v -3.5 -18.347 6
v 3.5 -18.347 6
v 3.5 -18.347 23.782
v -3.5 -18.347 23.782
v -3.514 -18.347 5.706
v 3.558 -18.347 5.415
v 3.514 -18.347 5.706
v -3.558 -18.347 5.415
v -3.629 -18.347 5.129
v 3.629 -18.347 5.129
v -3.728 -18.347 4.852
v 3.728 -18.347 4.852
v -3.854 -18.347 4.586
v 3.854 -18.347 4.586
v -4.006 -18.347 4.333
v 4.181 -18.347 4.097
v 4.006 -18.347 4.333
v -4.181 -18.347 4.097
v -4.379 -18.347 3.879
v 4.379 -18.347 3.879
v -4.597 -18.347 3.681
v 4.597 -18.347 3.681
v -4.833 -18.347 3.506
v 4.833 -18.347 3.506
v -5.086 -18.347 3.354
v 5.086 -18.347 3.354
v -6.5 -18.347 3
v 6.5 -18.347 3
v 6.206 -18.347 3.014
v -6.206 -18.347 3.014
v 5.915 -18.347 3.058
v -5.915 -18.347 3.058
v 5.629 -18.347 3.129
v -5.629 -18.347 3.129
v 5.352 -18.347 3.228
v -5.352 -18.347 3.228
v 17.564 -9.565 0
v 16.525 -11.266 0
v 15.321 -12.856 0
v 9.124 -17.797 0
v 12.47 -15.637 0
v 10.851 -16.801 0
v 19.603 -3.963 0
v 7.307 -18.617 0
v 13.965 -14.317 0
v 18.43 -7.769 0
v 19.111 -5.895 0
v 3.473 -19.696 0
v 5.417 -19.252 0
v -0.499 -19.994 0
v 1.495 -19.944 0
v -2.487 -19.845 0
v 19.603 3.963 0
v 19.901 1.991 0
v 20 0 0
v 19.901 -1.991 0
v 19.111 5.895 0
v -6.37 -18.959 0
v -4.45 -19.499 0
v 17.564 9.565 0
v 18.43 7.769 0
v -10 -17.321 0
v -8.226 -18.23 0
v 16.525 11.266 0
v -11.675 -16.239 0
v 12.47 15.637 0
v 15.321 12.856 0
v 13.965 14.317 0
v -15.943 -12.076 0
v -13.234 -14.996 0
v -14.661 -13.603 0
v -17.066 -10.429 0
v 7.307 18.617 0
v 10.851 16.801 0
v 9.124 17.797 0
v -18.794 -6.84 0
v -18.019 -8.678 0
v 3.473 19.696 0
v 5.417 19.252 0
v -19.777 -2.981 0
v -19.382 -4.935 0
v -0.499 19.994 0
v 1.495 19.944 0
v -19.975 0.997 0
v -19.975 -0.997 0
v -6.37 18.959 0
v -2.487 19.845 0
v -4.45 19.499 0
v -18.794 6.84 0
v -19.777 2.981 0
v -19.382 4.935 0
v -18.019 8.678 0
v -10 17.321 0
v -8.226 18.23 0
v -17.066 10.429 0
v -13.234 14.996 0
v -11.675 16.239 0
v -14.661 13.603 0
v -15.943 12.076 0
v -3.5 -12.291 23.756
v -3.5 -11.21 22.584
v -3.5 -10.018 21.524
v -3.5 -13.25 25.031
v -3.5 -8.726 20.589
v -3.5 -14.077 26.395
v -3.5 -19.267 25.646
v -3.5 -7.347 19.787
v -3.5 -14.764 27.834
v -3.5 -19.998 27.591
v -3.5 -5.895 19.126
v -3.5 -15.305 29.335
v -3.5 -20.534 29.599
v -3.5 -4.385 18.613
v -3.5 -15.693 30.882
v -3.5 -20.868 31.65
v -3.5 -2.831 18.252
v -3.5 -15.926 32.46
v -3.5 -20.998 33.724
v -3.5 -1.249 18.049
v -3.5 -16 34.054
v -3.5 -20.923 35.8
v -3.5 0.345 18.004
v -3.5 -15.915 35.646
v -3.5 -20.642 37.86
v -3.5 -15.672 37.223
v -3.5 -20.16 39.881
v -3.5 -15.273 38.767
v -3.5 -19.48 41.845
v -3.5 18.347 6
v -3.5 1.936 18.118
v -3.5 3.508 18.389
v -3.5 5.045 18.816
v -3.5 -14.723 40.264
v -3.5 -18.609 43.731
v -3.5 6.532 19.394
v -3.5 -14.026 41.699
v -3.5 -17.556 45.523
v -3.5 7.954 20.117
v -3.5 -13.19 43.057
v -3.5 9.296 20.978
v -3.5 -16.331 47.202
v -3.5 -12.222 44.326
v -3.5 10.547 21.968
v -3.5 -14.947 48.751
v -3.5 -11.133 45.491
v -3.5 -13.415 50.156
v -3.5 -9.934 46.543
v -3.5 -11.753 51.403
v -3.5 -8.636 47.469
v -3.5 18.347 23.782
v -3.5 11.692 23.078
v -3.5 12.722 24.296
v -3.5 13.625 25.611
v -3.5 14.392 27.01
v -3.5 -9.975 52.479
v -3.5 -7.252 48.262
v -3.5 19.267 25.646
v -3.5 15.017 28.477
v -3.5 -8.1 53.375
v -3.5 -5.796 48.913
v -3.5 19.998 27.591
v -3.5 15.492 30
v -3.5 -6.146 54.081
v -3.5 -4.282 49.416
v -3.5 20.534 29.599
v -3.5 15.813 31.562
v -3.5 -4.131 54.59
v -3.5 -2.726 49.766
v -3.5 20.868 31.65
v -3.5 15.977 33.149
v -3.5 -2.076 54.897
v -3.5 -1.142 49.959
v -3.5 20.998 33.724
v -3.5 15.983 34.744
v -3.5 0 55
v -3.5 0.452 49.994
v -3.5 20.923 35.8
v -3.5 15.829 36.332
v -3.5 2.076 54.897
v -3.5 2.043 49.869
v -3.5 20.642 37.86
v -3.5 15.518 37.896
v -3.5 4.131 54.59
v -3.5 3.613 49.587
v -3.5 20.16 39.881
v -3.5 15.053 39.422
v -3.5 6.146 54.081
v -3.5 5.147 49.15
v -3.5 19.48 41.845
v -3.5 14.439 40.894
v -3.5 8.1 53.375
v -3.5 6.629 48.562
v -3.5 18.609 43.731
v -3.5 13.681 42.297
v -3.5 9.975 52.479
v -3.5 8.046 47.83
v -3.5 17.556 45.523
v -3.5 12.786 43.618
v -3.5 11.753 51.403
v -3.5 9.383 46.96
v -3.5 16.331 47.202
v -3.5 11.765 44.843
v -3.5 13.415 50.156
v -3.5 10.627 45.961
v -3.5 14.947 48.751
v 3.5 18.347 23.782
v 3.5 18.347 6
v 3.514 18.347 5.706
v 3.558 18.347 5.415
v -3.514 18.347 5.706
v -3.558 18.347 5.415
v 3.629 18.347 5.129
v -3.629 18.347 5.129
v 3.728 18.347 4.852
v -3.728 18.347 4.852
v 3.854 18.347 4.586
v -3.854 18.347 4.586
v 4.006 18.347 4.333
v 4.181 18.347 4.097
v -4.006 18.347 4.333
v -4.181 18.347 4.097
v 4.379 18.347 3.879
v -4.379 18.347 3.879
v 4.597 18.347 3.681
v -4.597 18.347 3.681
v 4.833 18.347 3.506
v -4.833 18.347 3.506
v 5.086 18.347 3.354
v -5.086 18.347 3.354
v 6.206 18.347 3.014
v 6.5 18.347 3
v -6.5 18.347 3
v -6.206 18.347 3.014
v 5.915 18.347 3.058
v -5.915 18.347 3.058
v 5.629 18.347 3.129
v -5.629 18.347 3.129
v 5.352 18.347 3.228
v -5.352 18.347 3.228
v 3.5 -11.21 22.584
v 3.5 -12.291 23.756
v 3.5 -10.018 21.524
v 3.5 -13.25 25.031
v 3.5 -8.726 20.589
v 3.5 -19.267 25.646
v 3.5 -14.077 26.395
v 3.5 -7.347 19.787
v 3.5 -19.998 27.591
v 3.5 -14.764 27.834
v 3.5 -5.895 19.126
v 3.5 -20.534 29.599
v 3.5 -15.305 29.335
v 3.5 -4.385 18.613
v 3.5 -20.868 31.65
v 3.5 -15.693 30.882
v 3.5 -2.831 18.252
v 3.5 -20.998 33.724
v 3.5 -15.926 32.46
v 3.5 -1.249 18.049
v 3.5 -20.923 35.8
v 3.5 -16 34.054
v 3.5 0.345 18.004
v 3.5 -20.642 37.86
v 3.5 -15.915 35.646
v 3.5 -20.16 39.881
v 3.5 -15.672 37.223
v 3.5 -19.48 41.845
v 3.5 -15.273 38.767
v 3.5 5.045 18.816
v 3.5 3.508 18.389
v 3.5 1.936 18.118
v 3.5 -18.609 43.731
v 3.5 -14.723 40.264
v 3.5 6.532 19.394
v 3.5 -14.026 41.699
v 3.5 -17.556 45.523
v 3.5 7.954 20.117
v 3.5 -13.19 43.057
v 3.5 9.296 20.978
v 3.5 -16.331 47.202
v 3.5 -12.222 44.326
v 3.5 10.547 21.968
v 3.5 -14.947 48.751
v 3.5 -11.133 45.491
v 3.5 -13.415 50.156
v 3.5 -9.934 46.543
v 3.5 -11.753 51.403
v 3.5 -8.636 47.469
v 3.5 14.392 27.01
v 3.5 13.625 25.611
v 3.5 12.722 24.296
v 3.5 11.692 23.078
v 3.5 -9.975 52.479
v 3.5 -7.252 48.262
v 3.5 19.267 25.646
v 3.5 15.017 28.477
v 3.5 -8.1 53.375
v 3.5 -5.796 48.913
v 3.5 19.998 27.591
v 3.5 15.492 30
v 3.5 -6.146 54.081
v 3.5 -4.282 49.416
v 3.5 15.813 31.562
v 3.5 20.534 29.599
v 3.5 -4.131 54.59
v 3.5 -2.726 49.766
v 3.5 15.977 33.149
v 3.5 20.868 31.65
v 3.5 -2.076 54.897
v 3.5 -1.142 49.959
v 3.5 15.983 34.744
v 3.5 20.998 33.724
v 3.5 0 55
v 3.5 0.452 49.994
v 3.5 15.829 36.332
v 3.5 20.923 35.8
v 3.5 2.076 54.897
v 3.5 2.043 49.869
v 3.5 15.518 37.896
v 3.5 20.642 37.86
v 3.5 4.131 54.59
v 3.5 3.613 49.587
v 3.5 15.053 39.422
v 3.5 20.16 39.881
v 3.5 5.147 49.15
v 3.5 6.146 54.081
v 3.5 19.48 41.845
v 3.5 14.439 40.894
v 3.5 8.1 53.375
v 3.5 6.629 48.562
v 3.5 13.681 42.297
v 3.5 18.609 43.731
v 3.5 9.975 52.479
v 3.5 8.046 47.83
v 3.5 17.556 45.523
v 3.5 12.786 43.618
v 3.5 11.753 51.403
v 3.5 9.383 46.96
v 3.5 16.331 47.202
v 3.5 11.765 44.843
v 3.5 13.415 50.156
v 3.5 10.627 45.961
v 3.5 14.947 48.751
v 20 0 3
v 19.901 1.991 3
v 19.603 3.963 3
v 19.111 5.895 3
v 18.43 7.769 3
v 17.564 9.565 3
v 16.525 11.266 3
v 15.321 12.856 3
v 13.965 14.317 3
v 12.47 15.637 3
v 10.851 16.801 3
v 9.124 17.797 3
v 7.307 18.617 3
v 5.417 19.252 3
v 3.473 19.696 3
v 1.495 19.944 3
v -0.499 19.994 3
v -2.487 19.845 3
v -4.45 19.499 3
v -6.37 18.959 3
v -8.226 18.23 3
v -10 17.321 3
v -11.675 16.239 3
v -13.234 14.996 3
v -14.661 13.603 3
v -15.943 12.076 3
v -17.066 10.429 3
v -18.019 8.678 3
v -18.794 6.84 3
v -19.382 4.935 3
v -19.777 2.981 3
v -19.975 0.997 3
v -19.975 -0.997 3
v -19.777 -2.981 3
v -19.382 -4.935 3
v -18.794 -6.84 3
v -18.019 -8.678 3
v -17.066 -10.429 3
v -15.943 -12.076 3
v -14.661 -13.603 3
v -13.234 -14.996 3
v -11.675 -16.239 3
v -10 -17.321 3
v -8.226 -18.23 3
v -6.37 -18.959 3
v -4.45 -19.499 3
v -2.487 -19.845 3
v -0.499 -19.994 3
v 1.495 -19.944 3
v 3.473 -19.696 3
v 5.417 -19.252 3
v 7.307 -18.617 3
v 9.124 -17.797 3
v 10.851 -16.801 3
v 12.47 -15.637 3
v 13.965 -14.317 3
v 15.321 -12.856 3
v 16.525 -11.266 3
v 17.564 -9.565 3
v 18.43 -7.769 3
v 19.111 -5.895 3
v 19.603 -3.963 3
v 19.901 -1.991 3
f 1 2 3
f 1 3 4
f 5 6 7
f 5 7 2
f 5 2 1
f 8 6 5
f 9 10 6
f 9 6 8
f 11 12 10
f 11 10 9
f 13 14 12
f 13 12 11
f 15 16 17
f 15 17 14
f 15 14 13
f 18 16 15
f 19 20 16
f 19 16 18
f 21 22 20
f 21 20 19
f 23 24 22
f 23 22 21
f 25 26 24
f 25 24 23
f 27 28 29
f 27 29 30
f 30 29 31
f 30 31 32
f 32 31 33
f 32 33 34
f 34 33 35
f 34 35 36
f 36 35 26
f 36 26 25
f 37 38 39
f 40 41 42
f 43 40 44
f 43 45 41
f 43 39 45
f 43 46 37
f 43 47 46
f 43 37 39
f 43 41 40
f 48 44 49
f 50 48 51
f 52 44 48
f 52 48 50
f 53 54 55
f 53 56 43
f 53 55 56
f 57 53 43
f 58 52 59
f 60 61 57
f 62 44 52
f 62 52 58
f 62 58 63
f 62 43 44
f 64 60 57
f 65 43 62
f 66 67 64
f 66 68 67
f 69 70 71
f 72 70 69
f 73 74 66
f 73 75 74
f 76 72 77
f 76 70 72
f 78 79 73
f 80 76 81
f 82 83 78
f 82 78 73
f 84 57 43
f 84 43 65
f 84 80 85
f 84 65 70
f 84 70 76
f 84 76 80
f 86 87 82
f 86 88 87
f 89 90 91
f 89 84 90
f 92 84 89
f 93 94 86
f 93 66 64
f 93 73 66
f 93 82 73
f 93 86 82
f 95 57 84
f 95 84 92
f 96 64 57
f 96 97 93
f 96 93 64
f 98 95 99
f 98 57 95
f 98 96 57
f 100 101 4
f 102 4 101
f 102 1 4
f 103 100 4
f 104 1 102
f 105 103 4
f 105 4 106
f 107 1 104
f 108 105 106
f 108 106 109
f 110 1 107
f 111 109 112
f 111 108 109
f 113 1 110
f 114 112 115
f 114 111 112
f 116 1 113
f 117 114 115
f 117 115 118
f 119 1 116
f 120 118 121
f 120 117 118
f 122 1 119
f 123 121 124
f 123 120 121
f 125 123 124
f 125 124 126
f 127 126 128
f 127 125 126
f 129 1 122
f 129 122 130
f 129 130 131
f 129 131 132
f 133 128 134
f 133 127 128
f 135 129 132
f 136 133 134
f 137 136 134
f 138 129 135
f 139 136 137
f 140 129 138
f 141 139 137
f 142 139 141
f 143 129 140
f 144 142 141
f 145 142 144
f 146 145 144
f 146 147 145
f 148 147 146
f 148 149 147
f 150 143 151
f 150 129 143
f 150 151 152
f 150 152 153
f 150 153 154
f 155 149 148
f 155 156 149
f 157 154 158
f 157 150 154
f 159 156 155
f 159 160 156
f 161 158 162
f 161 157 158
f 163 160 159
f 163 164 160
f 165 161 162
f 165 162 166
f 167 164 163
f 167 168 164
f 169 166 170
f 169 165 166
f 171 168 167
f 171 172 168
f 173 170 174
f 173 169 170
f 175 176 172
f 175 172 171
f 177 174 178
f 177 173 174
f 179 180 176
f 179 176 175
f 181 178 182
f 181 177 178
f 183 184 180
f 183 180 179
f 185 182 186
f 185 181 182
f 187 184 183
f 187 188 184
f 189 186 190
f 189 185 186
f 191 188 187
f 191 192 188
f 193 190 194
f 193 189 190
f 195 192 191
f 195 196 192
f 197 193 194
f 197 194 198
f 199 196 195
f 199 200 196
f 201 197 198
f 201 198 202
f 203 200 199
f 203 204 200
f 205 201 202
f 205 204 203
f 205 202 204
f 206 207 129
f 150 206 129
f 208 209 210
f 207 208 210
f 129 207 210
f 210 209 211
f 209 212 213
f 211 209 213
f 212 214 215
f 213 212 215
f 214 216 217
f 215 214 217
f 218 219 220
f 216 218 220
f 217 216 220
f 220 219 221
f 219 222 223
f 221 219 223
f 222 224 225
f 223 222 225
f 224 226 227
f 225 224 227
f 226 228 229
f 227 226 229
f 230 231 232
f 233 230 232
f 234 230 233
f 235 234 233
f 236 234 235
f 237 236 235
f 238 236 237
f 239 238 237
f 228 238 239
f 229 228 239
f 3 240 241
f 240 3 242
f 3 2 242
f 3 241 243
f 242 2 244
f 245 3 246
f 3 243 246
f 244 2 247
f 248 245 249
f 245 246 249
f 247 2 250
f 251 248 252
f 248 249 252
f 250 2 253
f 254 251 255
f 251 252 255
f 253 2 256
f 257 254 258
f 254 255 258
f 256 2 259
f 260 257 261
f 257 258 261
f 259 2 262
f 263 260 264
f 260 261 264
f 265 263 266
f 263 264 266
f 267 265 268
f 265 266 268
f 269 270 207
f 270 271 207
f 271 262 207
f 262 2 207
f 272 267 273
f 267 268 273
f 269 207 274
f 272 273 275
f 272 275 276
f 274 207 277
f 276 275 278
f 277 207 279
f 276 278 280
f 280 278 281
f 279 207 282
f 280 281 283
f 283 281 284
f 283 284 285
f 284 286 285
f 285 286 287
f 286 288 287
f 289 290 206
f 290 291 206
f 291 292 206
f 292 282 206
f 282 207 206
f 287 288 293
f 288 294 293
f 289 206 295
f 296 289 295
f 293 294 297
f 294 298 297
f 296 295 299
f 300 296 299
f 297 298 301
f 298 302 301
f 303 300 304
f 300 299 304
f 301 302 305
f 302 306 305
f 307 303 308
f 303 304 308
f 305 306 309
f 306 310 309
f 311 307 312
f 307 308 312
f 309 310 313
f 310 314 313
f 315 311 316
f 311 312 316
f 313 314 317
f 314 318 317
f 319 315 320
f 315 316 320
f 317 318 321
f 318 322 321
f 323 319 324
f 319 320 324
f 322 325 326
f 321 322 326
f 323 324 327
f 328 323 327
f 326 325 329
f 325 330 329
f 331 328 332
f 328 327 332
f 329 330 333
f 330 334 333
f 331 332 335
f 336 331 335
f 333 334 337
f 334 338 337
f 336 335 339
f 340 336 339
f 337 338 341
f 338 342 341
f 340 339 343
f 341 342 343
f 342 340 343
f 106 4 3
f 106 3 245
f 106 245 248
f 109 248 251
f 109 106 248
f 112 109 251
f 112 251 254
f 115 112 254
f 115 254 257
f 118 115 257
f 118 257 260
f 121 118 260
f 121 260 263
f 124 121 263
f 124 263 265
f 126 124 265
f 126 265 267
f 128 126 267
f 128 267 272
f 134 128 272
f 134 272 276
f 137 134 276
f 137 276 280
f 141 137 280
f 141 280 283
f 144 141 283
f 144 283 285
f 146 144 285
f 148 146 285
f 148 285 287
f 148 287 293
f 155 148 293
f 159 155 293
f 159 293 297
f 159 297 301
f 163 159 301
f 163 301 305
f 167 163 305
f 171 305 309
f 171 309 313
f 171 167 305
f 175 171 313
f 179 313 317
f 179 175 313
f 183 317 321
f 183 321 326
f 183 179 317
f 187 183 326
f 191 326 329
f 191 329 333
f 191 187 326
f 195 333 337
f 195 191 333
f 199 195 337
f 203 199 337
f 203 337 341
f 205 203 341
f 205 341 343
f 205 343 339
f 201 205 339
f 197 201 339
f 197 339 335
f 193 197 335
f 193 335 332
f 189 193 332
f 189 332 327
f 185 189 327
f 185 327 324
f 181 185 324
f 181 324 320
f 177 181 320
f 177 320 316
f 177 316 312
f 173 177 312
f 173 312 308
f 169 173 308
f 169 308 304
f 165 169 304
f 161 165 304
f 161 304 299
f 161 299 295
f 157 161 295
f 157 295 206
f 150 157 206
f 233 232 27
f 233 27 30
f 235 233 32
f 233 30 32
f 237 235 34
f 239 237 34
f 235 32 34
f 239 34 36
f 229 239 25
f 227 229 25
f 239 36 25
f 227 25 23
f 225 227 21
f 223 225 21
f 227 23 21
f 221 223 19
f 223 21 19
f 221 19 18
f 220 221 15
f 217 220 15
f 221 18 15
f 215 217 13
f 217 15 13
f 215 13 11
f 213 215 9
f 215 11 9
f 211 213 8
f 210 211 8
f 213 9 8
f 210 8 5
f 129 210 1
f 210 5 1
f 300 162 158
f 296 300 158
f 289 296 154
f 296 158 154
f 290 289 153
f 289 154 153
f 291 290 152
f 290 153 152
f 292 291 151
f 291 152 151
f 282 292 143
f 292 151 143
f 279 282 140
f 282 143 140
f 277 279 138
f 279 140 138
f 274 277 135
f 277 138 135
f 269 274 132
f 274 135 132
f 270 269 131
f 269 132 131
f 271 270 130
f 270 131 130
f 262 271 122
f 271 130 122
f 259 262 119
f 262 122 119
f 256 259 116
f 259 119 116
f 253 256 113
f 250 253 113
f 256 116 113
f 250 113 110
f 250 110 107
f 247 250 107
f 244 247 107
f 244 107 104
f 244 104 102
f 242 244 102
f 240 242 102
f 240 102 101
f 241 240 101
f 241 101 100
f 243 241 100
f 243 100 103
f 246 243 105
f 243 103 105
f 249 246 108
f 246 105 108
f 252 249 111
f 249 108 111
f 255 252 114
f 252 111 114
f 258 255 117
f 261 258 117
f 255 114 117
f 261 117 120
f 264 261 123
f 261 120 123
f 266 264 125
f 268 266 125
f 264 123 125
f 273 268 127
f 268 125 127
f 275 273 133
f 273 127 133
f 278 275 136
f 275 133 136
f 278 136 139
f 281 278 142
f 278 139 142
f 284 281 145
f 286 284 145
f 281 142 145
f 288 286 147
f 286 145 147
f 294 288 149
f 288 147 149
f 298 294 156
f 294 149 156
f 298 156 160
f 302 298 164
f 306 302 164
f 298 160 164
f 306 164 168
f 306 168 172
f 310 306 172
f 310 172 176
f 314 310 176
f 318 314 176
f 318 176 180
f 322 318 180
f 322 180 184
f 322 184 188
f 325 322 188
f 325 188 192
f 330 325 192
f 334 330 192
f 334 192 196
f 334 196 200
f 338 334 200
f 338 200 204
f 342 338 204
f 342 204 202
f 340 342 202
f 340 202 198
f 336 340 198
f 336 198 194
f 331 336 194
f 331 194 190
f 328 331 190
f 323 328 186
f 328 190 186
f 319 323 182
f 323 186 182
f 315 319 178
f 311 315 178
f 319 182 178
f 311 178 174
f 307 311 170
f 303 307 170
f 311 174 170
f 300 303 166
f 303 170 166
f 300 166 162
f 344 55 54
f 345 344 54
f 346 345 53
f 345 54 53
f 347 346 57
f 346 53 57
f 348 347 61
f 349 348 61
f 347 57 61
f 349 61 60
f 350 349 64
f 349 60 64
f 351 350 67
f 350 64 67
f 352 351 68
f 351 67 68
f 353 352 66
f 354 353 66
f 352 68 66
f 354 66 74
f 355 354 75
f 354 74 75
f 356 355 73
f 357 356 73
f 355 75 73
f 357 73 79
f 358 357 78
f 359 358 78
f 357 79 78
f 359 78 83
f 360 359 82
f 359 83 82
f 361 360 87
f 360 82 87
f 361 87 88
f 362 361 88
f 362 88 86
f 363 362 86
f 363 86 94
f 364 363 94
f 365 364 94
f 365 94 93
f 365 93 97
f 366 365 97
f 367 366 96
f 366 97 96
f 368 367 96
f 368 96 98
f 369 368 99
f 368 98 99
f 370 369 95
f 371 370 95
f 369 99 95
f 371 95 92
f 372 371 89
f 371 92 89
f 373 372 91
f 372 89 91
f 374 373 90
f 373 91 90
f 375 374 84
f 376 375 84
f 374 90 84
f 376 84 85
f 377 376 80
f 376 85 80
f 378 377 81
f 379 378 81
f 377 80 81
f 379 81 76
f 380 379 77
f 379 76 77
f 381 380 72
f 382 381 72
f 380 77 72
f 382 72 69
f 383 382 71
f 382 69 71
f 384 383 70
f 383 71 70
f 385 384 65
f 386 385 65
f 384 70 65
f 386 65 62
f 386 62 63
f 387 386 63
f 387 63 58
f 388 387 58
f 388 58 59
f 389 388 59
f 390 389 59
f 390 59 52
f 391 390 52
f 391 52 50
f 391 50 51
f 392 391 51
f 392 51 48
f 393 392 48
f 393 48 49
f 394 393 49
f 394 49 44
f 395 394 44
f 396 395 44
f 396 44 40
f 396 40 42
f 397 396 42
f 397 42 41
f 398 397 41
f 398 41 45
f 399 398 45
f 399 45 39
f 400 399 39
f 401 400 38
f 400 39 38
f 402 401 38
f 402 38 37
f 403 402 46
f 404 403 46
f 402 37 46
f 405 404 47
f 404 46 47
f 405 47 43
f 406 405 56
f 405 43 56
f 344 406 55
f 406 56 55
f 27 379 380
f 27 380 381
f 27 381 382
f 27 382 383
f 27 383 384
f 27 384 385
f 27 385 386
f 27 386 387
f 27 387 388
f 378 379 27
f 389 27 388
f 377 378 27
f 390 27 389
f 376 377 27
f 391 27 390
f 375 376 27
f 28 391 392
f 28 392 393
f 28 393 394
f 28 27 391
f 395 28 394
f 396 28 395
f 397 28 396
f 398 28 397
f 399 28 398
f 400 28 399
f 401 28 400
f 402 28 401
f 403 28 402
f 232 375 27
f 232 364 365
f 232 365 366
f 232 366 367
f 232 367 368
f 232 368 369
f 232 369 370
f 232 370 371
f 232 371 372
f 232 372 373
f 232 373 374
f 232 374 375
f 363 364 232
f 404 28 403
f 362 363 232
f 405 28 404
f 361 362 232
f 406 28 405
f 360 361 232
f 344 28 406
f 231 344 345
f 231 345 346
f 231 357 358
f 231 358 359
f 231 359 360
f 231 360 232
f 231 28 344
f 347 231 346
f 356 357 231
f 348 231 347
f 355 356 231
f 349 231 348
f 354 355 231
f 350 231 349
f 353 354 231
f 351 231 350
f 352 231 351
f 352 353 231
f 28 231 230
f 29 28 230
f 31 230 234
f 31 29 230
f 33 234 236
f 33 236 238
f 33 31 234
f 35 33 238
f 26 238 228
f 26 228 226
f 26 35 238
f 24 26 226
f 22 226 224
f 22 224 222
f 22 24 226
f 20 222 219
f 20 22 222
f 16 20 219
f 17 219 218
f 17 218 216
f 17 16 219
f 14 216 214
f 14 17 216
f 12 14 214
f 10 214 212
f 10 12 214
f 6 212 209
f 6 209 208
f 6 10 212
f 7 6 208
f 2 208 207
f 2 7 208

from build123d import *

# Parameters (mm, degrees)
SKETCH1_R           = 20
BOSS_EXTRUDE1_DEPTH = 3
SKETCH2_W           = 7
SKETCH2_H           = 36.693281072
BOSS_EXTRUDE2_DEPTH = 30
FILLET2_R           = 3
SKETCH3_R           = 21
SKETCH3_R_2         = 16
BOSS_EXTRUDE3_DEPTH = 7
SKETCH4_R           = 16
CUT_EXTRUDE1_DEPTH  = 7


with BuildPart() as part:
    # Sketch1 → Boss-Extrude1 (new body)
    with BuildSketch(Plane.XY):
        Circle(SKETCH1_R)
    extrude(amount=BOSS_EXTRUDE1_DEPTH)

    # Sketch2 → Boss-Extrude2 (add)
    with BuildSketch(Plane(origin=(0, 0, 0), x_dir=(-1, 0, 0), z_dir=(0, 0, -1))):
        Rectangle(SKETCH2_W, SKETCH2_H)
    extrude(amount=-BOSS_EXTRUDE2_DEPTH)

    # Fillet2
    fillet2_edges = [part.edges().sort_by_distance(p)[0] for p in [
        (3.5, 0, 3),
        (-3.5, 0, 3),
    ]]
    fillet(fillet2_edges, radius=FILLET2_R)

    # Sketch3 → Boss-Extrude3 (add)
    with BuildSketch(Plane.ZY.offset(3.5)):
        with Locations((34, 0)):
            Circle(SKETCH3_R)
        with Locations((34, 0)):
            Circle(SKETCH3_R_2, mode=Mode.SUBTRACT)
    extrude(amount=-BOSS_EXTRUDE3_DEPTH)

    # Sketch4 → Cut-Extrude1 (cut)
    with BuildSketch(Plane.ZY.offset(3.5)):
        with Locations(Location((34, 0, 0), (0, 0, 270))):
            Circle(SKETCH4_R)
    extrude(amount=-CUT_EXTRUDE1_DEPTH, mode=Mode.SUBTRACT)


solid = part.part
